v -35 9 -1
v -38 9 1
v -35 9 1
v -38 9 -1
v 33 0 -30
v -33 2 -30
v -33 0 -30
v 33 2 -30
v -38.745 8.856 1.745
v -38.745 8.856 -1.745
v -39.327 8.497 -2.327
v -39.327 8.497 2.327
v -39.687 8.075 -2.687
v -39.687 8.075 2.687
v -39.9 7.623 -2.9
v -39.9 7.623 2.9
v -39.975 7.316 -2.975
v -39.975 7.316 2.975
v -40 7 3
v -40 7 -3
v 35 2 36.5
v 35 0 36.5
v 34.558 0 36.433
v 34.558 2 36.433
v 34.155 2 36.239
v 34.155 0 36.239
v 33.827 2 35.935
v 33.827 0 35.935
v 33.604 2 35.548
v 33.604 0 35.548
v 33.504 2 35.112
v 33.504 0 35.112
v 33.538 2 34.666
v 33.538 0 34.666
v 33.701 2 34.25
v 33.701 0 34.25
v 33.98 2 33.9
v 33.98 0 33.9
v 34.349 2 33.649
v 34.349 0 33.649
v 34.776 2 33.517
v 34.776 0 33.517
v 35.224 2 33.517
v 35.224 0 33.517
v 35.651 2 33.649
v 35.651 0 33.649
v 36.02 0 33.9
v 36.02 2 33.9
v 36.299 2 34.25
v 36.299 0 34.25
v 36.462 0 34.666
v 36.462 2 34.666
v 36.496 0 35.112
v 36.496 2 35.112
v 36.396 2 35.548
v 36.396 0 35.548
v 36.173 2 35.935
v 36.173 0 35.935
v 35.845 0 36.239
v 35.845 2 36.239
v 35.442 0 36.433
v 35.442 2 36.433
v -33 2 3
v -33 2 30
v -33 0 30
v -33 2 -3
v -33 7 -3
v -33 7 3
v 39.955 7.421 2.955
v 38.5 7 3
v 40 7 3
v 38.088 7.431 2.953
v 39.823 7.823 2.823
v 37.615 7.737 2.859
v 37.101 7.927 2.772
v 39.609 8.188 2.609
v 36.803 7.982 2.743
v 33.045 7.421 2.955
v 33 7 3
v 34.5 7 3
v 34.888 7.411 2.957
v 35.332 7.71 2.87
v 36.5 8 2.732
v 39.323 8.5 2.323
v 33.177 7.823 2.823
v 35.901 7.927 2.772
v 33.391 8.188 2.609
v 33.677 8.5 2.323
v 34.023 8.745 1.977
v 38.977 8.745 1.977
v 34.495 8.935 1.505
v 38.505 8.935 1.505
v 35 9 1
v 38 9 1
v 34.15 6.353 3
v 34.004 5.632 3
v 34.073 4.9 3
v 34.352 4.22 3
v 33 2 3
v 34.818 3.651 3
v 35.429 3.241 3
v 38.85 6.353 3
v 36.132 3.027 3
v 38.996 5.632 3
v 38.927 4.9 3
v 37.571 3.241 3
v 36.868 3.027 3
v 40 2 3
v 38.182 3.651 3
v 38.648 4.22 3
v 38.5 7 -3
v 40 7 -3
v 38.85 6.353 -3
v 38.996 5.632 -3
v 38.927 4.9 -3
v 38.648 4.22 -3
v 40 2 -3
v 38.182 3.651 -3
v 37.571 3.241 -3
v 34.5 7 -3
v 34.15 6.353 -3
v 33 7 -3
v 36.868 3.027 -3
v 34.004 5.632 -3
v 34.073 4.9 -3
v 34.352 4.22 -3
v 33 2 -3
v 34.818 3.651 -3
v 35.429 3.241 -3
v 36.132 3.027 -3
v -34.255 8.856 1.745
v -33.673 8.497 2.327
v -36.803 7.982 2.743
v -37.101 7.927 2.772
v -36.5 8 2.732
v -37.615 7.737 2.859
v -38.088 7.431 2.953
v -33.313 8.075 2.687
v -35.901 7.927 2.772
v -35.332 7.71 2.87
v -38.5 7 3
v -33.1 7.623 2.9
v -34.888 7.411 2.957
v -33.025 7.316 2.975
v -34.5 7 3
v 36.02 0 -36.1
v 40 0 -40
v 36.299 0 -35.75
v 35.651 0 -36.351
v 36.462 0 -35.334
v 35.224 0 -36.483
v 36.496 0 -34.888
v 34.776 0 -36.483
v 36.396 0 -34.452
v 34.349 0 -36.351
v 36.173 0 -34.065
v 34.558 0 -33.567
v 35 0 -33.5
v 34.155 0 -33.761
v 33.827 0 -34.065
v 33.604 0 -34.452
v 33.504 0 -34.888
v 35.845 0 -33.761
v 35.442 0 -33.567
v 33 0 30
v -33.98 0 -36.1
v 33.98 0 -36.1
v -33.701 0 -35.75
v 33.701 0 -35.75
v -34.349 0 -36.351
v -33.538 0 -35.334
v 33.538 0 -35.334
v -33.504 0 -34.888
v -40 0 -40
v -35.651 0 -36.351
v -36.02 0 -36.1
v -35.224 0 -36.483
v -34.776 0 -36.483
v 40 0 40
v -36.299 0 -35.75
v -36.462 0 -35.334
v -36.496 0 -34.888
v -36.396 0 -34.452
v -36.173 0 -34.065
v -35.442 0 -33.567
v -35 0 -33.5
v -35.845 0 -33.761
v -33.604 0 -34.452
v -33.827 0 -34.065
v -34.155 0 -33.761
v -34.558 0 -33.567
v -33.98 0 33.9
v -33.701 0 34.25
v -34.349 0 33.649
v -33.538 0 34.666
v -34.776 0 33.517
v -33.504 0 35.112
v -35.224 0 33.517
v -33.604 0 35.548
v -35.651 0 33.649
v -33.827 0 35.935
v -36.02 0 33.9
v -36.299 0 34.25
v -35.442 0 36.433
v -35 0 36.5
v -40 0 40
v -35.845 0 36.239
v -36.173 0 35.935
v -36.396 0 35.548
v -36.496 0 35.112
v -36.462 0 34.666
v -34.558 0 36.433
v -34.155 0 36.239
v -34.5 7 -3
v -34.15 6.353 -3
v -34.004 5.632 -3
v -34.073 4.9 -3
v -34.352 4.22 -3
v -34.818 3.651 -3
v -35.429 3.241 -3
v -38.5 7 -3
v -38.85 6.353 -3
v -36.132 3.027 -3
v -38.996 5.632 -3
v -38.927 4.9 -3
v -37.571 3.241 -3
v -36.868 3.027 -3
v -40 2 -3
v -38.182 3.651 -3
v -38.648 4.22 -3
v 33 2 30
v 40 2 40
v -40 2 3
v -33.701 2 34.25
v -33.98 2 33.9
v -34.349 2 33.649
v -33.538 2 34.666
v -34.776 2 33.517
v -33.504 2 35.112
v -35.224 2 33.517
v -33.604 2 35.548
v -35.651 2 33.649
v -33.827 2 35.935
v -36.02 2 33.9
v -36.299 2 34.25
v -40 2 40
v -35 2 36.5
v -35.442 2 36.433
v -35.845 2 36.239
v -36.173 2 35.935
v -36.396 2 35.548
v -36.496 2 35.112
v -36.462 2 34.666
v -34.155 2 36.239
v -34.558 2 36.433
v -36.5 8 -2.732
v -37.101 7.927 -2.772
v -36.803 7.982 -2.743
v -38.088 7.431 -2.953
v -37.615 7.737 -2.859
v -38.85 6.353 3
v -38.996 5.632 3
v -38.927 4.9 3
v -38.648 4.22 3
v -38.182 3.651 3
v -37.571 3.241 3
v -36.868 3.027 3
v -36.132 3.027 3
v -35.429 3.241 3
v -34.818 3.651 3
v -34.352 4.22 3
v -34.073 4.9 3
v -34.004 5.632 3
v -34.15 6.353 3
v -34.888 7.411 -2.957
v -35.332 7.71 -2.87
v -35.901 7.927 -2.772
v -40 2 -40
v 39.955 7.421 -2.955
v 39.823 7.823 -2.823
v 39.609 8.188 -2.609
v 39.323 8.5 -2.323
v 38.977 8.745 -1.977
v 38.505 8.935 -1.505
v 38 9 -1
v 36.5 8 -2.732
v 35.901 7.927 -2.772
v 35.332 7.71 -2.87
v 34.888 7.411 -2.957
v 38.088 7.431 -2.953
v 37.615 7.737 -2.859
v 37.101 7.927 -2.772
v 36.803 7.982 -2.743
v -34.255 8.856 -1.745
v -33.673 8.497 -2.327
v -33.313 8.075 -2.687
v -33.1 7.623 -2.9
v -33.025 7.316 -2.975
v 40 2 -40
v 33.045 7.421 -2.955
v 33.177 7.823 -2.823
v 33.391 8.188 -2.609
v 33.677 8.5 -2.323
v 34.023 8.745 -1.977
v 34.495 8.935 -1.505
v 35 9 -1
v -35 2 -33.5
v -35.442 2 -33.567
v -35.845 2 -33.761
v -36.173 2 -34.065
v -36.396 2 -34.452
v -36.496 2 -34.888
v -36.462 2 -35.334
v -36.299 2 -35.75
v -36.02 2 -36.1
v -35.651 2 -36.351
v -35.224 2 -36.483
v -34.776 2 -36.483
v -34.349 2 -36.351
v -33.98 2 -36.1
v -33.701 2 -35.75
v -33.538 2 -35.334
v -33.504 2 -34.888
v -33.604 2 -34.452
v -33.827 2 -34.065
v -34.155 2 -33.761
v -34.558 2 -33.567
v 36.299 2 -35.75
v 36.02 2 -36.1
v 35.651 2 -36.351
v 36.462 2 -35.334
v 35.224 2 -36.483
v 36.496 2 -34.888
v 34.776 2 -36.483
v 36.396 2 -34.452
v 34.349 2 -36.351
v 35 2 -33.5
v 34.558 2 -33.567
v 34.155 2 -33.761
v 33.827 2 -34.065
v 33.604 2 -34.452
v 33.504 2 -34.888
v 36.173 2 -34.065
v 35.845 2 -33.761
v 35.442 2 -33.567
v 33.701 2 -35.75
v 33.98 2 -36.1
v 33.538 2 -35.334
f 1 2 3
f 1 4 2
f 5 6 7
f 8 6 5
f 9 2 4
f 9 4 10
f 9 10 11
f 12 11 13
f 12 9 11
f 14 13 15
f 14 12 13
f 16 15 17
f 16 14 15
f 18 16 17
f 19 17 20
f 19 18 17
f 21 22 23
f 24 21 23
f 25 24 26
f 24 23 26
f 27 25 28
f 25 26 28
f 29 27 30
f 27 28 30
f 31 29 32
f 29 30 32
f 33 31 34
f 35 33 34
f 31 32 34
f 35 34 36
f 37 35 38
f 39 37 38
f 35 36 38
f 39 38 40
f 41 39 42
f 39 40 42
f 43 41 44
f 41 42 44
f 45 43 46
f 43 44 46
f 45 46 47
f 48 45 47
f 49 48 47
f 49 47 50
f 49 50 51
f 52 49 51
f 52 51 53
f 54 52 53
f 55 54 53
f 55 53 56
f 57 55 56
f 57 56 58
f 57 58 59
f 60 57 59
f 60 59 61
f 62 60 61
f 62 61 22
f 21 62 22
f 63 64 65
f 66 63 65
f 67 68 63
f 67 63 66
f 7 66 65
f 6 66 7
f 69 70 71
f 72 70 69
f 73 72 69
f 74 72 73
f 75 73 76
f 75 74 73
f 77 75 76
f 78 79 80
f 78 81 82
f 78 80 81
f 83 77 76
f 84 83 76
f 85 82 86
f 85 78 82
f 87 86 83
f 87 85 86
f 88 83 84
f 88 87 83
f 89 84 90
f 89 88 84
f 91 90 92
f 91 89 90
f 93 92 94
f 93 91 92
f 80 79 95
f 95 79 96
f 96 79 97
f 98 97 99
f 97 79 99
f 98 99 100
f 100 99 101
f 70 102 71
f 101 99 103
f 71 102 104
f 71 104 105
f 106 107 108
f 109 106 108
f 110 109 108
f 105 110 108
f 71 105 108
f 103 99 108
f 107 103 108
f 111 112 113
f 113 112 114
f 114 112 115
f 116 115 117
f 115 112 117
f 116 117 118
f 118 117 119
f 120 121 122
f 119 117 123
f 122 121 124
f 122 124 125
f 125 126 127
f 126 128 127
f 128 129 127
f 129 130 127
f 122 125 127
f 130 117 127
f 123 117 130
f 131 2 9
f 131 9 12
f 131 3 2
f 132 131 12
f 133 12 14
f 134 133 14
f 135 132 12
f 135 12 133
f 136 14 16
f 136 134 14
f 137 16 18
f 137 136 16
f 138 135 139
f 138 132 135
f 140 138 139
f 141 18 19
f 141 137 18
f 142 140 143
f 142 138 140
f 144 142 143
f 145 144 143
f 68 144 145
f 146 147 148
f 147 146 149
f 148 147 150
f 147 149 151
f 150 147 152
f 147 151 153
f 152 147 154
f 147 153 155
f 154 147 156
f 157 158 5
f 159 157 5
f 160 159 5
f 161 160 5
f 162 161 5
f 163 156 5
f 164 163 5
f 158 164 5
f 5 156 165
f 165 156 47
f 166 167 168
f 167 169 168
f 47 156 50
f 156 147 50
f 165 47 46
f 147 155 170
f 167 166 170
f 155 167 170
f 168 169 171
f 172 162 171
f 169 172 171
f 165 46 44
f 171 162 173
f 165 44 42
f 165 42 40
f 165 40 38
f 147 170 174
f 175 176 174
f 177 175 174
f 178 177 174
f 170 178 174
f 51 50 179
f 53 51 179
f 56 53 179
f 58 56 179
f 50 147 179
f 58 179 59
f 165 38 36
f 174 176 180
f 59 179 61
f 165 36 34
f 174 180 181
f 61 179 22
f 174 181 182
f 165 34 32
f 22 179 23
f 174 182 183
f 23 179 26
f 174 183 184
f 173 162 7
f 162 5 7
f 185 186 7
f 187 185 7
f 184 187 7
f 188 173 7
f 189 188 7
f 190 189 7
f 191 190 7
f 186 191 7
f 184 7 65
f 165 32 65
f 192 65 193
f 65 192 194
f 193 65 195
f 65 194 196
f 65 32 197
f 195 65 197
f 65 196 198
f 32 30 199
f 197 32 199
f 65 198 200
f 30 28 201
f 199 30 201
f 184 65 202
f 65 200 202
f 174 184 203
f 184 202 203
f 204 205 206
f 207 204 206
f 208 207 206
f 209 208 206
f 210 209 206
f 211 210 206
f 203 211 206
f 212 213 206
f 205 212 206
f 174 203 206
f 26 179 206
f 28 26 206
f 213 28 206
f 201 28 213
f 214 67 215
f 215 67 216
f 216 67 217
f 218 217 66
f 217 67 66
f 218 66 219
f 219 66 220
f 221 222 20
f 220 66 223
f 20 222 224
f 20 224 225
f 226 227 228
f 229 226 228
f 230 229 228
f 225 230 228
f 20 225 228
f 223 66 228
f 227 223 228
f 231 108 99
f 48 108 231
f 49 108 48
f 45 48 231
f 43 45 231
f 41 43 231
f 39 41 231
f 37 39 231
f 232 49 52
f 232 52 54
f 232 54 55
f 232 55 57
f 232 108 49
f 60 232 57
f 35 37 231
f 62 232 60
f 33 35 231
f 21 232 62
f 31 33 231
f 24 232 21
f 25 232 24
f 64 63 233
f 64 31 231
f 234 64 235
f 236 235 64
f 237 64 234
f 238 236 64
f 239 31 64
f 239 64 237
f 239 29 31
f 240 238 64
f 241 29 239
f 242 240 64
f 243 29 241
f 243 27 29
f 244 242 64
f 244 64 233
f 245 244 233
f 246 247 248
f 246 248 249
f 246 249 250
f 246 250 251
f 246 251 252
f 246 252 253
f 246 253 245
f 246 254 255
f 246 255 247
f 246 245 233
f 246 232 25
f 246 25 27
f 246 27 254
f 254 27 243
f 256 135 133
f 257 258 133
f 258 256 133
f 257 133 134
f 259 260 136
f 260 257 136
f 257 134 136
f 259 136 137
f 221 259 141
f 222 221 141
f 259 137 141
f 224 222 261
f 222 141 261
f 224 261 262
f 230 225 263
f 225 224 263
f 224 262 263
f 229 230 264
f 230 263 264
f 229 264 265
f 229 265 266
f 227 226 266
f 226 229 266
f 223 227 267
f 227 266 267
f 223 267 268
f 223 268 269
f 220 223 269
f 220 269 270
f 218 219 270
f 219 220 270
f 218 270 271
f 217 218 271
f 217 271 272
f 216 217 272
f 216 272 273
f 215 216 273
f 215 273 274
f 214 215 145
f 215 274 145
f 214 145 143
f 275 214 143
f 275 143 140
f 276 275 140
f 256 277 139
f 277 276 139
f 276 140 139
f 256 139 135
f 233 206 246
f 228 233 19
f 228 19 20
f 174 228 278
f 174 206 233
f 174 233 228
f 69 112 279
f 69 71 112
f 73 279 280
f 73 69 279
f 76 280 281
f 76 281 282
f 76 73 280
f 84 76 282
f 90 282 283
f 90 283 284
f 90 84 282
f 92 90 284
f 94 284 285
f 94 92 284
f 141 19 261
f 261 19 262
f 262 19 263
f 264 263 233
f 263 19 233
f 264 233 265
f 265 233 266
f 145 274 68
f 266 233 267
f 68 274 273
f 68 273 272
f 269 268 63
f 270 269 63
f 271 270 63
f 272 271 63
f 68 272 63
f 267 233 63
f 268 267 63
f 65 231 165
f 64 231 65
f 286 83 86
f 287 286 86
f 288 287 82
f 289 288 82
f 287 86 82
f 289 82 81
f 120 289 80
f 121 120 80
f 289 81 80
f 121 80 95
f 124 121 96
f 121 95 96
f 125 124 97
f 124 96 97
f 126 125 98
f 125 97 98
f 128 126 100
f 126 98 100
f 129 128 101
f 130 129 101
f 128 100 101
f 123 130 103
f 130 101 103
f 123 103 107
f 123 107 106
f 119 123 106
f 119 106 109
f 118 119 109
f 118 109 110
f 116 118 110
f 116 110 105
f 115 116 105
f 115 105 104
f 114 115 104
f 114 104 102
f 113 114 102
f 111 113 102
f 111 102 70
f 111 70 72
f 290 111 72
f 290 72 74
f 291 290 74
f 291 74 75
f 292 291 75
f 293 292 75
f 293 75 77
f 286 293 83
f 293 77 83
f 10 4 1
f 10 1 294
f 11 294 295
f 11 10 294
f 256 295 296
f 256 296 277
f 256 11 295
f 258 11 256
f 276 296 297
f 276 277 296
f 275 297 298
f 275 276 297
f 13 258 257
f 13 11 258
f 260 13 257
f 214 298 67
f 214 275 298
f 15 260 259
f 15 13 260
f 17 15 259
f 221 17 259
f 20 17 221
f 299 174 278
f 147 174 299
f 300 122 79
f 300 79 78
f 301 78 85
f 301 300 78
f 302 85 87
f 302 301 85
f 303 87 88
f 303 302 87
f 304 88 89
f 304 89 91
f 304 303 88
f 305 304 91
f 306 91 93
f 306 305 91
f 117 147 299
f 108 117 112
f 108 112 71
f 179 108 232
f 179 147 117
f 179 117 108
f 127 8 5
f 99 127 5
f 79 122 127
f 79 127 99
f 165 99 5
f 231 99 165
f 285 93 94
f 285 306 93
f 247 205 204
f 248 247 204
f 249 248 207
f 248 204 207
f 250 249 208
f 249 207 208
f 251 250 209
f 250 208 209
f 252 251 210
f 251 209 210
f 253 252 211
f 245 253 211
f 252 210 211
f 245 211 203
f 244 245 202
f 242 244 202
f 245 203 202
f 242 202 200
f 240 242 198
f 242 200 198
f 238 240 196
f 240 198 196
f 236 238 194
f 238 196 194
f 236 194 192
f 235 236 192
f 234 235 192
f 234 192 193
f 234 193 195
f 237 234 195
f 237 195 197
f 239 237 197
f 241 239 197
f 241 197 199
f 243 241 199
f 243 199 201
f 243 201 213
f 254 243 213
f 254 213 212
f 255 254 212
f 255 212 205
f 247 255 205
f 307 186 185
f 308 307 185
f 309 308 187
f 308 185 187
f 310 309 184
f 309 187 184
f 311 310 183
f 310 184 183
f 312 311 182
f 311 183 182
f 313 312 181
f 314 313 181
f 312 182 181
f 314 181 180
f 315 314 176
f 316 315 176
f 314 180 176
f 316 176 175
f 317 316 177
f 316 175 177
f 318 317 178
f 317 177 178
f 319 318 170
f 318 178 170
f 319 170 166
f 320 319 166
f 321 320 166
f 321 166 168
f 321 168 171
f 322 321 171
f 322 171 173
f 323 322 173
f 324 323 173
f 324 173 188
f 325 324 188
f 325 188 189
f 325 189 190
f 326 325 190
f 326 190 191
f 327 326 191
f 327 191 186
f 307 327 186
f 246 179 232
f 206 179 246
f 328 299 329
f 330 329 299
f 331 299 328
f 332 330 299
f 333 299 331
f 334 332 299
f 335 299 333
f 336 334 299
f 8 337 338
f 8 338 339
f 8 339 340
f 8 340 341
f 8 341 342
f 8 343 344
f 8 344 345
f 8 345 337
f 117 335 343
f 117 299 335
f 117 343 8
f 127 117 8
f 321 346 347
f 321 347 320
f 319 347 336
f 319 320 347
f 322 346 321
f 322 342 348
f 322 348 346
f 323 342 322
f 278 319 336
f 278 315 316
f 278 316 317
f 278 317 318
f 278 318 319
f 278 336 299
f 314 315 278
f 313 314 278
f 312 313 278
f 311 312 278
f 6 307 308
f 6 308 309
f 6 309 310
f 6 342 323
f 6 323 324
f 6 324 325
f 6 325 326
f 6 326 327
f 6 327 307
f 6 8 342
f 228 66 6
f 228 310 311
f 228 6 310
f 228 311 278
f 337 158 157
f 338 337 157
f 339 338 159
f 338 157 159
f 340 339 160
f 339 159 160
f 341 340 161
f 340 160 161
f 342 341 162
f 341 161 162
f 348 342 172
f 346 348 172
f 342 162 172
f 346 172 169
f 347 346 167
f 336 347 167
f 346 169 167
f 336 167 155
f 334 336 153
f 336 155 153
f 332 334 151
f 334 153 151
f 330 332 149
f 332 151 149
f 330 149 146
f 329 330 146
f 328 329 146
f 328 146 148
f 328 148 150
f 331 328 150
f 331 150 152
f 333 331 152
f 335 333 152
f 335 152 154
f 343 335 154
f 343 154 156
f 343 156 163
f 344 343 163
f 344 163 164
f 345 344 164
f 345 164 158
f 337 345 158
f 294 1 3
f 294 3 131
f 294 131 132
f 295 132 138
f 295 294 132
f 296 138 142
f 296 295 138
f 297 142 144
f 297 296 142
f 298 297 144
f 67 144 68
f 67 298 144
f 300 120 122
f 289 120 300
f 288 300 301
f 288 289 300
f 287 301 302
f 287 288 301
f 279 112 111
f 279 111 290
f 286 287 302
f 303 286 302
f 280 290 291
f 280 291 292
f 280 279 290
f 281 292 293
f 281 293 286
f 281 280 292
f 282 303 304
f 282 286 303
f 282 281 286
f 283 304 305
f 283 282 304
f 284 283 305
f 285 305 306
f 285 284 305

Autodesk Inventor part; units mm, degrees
ref_plane "YZ Plane" through (0, 0, 0) normal (1, 0, 0) x (0, 1, 0)
ref_plane "XZ Plane" through (0, 0, 0) normal (0, 1, 0) x (-1, 0, 0)
ref_plane "XY Plane" through (0, 0, 0) normal (0, 0, 1) x (1, 0, 0)
sketch "Esquisse1" plane through (0, 0, 0) normal (0, 1, 0) x (-1, 0, 0)
  line L0 (-40, 40) -> (40, 40)
  line L1 (40, 40) -> (40, -40)
  line L2 (40, -40) -> (-40, -40)
  line L3 (-40, -40) -> (-40, 40)
  line L4 (-40, 40) -> (40, -40) construction
  line L5 (40, 40) -> (-40, -40) construction
  point P0 (0, 0)
  dimension "d0" = 80
extrude "Extrusion1" add sketch "Esquisse1" along normal blind 2
sketch "Esquisse2" plane through (0, 2, 0) normal (0, 1, 0) x (1, 0, 0)
  point P0 (0, 0)
sketch "Esquisse3" plane through (0, 2, 0) normal (0, 1, 0) x (1, 0, 0)
  line L0 (33, -30) -> (-33, -30)
  line L1 (-33, -30) -> (-33, 30)
  line L2 (-33, 30) -> (33, 30)
  line L3 (33, 30) -> (33, -30)
  line L4 (33, -30) -> (-33, 30) construction
  line L5 (-33, -30) -> (33, 30) construction
  point P0 (0, 0)
  dimension "d3" = 66
  dimension "d4" = 60
extrude "Extrusion2" cut sketch "Esquisse3" against normal blind 10
sketch "Esquisse10" plane through (0, 2, 0) normal (0, 1, 0) x (1, 0, 0)
  line L0 (35, 35) -> (-35, 35)
  line L1 (-35, 35) -> (-35, -35)
  line L2 (-35, -35) -> (35, -35)
  line L3 (35, -35) -> (35, 35)
  line L4 (35, 35) -> (-35, -35) construction
  line L5 (-35, 35) -> (35, -35) construction
  line L6 (-40, 40) -> (-40, -40) projected
  line L7 (-40, -40) -> (40, -40) projected
  point P0 (0, 0)
  point P1 (-40, -5)
  dimension "d23" = 5
  dimension "d24" = 5
hole "Perçage1" at (35, 2, 35) at (-35, 2, 35) at (-35, 2, -35) at (35, 2, -35) direction (0, -1, 0) diameter 3 depth 66.675 tip angle 118
sketch "Esquisse11" plane through (0, 2, 0) normal (0, 1, 0) x (1, 0, 0)
  line L0 (40, -40) -> (40, 40) projected
  line L1 (33, 30) -> (33, -30) projected
  line L2 (40, 3) -> (33, 3)
  line L3 (33, 3) -> (33, -3)
  line L4 (33, -3) -> (40, -3)
  line L5 (40, -3) -> (40, 3)
  point P0 (0, 0)
  dimension "d37" = 3
  dimension "d38" = 3
extrude "Extrusion9" add sketch "Esquisse11" along normal blind 7
sketch "Esquisse12" plane through (40, 2, -3) normal (0, 0, -1) x (-1, 0, 0)
  line L0 (7, 0) -> (0, 0) projected
  line L1 (0, 0) -> (7, 6.8816)
  line L2 (0, 0) -> (0, 7) projected
  line L3 (7, 0) -> (0, 7)
  point P0 (40, -2)
  point P1 (3.5, 3.5)
hole "Perçage2" at (36.5, 5.5, -3) direction (0, 0, 1) diameter 5 depth 66.675 tip angle 118
fillet "Congé1" radius 2 4 edges at (36.5, 9, -3) (40, 9, 0) (36.5, 9, 3) (33, 9, 0)
ref_plane "Plan de construction1" through (0, 0, -40) normal (-1, 0, 0) x (0, 0, 1)
mirror "Symétrie1" about plane through (0, 0, -40) normal (-1, 0, 0) of "Extrusion9", "Perçage2", "Congé1"
